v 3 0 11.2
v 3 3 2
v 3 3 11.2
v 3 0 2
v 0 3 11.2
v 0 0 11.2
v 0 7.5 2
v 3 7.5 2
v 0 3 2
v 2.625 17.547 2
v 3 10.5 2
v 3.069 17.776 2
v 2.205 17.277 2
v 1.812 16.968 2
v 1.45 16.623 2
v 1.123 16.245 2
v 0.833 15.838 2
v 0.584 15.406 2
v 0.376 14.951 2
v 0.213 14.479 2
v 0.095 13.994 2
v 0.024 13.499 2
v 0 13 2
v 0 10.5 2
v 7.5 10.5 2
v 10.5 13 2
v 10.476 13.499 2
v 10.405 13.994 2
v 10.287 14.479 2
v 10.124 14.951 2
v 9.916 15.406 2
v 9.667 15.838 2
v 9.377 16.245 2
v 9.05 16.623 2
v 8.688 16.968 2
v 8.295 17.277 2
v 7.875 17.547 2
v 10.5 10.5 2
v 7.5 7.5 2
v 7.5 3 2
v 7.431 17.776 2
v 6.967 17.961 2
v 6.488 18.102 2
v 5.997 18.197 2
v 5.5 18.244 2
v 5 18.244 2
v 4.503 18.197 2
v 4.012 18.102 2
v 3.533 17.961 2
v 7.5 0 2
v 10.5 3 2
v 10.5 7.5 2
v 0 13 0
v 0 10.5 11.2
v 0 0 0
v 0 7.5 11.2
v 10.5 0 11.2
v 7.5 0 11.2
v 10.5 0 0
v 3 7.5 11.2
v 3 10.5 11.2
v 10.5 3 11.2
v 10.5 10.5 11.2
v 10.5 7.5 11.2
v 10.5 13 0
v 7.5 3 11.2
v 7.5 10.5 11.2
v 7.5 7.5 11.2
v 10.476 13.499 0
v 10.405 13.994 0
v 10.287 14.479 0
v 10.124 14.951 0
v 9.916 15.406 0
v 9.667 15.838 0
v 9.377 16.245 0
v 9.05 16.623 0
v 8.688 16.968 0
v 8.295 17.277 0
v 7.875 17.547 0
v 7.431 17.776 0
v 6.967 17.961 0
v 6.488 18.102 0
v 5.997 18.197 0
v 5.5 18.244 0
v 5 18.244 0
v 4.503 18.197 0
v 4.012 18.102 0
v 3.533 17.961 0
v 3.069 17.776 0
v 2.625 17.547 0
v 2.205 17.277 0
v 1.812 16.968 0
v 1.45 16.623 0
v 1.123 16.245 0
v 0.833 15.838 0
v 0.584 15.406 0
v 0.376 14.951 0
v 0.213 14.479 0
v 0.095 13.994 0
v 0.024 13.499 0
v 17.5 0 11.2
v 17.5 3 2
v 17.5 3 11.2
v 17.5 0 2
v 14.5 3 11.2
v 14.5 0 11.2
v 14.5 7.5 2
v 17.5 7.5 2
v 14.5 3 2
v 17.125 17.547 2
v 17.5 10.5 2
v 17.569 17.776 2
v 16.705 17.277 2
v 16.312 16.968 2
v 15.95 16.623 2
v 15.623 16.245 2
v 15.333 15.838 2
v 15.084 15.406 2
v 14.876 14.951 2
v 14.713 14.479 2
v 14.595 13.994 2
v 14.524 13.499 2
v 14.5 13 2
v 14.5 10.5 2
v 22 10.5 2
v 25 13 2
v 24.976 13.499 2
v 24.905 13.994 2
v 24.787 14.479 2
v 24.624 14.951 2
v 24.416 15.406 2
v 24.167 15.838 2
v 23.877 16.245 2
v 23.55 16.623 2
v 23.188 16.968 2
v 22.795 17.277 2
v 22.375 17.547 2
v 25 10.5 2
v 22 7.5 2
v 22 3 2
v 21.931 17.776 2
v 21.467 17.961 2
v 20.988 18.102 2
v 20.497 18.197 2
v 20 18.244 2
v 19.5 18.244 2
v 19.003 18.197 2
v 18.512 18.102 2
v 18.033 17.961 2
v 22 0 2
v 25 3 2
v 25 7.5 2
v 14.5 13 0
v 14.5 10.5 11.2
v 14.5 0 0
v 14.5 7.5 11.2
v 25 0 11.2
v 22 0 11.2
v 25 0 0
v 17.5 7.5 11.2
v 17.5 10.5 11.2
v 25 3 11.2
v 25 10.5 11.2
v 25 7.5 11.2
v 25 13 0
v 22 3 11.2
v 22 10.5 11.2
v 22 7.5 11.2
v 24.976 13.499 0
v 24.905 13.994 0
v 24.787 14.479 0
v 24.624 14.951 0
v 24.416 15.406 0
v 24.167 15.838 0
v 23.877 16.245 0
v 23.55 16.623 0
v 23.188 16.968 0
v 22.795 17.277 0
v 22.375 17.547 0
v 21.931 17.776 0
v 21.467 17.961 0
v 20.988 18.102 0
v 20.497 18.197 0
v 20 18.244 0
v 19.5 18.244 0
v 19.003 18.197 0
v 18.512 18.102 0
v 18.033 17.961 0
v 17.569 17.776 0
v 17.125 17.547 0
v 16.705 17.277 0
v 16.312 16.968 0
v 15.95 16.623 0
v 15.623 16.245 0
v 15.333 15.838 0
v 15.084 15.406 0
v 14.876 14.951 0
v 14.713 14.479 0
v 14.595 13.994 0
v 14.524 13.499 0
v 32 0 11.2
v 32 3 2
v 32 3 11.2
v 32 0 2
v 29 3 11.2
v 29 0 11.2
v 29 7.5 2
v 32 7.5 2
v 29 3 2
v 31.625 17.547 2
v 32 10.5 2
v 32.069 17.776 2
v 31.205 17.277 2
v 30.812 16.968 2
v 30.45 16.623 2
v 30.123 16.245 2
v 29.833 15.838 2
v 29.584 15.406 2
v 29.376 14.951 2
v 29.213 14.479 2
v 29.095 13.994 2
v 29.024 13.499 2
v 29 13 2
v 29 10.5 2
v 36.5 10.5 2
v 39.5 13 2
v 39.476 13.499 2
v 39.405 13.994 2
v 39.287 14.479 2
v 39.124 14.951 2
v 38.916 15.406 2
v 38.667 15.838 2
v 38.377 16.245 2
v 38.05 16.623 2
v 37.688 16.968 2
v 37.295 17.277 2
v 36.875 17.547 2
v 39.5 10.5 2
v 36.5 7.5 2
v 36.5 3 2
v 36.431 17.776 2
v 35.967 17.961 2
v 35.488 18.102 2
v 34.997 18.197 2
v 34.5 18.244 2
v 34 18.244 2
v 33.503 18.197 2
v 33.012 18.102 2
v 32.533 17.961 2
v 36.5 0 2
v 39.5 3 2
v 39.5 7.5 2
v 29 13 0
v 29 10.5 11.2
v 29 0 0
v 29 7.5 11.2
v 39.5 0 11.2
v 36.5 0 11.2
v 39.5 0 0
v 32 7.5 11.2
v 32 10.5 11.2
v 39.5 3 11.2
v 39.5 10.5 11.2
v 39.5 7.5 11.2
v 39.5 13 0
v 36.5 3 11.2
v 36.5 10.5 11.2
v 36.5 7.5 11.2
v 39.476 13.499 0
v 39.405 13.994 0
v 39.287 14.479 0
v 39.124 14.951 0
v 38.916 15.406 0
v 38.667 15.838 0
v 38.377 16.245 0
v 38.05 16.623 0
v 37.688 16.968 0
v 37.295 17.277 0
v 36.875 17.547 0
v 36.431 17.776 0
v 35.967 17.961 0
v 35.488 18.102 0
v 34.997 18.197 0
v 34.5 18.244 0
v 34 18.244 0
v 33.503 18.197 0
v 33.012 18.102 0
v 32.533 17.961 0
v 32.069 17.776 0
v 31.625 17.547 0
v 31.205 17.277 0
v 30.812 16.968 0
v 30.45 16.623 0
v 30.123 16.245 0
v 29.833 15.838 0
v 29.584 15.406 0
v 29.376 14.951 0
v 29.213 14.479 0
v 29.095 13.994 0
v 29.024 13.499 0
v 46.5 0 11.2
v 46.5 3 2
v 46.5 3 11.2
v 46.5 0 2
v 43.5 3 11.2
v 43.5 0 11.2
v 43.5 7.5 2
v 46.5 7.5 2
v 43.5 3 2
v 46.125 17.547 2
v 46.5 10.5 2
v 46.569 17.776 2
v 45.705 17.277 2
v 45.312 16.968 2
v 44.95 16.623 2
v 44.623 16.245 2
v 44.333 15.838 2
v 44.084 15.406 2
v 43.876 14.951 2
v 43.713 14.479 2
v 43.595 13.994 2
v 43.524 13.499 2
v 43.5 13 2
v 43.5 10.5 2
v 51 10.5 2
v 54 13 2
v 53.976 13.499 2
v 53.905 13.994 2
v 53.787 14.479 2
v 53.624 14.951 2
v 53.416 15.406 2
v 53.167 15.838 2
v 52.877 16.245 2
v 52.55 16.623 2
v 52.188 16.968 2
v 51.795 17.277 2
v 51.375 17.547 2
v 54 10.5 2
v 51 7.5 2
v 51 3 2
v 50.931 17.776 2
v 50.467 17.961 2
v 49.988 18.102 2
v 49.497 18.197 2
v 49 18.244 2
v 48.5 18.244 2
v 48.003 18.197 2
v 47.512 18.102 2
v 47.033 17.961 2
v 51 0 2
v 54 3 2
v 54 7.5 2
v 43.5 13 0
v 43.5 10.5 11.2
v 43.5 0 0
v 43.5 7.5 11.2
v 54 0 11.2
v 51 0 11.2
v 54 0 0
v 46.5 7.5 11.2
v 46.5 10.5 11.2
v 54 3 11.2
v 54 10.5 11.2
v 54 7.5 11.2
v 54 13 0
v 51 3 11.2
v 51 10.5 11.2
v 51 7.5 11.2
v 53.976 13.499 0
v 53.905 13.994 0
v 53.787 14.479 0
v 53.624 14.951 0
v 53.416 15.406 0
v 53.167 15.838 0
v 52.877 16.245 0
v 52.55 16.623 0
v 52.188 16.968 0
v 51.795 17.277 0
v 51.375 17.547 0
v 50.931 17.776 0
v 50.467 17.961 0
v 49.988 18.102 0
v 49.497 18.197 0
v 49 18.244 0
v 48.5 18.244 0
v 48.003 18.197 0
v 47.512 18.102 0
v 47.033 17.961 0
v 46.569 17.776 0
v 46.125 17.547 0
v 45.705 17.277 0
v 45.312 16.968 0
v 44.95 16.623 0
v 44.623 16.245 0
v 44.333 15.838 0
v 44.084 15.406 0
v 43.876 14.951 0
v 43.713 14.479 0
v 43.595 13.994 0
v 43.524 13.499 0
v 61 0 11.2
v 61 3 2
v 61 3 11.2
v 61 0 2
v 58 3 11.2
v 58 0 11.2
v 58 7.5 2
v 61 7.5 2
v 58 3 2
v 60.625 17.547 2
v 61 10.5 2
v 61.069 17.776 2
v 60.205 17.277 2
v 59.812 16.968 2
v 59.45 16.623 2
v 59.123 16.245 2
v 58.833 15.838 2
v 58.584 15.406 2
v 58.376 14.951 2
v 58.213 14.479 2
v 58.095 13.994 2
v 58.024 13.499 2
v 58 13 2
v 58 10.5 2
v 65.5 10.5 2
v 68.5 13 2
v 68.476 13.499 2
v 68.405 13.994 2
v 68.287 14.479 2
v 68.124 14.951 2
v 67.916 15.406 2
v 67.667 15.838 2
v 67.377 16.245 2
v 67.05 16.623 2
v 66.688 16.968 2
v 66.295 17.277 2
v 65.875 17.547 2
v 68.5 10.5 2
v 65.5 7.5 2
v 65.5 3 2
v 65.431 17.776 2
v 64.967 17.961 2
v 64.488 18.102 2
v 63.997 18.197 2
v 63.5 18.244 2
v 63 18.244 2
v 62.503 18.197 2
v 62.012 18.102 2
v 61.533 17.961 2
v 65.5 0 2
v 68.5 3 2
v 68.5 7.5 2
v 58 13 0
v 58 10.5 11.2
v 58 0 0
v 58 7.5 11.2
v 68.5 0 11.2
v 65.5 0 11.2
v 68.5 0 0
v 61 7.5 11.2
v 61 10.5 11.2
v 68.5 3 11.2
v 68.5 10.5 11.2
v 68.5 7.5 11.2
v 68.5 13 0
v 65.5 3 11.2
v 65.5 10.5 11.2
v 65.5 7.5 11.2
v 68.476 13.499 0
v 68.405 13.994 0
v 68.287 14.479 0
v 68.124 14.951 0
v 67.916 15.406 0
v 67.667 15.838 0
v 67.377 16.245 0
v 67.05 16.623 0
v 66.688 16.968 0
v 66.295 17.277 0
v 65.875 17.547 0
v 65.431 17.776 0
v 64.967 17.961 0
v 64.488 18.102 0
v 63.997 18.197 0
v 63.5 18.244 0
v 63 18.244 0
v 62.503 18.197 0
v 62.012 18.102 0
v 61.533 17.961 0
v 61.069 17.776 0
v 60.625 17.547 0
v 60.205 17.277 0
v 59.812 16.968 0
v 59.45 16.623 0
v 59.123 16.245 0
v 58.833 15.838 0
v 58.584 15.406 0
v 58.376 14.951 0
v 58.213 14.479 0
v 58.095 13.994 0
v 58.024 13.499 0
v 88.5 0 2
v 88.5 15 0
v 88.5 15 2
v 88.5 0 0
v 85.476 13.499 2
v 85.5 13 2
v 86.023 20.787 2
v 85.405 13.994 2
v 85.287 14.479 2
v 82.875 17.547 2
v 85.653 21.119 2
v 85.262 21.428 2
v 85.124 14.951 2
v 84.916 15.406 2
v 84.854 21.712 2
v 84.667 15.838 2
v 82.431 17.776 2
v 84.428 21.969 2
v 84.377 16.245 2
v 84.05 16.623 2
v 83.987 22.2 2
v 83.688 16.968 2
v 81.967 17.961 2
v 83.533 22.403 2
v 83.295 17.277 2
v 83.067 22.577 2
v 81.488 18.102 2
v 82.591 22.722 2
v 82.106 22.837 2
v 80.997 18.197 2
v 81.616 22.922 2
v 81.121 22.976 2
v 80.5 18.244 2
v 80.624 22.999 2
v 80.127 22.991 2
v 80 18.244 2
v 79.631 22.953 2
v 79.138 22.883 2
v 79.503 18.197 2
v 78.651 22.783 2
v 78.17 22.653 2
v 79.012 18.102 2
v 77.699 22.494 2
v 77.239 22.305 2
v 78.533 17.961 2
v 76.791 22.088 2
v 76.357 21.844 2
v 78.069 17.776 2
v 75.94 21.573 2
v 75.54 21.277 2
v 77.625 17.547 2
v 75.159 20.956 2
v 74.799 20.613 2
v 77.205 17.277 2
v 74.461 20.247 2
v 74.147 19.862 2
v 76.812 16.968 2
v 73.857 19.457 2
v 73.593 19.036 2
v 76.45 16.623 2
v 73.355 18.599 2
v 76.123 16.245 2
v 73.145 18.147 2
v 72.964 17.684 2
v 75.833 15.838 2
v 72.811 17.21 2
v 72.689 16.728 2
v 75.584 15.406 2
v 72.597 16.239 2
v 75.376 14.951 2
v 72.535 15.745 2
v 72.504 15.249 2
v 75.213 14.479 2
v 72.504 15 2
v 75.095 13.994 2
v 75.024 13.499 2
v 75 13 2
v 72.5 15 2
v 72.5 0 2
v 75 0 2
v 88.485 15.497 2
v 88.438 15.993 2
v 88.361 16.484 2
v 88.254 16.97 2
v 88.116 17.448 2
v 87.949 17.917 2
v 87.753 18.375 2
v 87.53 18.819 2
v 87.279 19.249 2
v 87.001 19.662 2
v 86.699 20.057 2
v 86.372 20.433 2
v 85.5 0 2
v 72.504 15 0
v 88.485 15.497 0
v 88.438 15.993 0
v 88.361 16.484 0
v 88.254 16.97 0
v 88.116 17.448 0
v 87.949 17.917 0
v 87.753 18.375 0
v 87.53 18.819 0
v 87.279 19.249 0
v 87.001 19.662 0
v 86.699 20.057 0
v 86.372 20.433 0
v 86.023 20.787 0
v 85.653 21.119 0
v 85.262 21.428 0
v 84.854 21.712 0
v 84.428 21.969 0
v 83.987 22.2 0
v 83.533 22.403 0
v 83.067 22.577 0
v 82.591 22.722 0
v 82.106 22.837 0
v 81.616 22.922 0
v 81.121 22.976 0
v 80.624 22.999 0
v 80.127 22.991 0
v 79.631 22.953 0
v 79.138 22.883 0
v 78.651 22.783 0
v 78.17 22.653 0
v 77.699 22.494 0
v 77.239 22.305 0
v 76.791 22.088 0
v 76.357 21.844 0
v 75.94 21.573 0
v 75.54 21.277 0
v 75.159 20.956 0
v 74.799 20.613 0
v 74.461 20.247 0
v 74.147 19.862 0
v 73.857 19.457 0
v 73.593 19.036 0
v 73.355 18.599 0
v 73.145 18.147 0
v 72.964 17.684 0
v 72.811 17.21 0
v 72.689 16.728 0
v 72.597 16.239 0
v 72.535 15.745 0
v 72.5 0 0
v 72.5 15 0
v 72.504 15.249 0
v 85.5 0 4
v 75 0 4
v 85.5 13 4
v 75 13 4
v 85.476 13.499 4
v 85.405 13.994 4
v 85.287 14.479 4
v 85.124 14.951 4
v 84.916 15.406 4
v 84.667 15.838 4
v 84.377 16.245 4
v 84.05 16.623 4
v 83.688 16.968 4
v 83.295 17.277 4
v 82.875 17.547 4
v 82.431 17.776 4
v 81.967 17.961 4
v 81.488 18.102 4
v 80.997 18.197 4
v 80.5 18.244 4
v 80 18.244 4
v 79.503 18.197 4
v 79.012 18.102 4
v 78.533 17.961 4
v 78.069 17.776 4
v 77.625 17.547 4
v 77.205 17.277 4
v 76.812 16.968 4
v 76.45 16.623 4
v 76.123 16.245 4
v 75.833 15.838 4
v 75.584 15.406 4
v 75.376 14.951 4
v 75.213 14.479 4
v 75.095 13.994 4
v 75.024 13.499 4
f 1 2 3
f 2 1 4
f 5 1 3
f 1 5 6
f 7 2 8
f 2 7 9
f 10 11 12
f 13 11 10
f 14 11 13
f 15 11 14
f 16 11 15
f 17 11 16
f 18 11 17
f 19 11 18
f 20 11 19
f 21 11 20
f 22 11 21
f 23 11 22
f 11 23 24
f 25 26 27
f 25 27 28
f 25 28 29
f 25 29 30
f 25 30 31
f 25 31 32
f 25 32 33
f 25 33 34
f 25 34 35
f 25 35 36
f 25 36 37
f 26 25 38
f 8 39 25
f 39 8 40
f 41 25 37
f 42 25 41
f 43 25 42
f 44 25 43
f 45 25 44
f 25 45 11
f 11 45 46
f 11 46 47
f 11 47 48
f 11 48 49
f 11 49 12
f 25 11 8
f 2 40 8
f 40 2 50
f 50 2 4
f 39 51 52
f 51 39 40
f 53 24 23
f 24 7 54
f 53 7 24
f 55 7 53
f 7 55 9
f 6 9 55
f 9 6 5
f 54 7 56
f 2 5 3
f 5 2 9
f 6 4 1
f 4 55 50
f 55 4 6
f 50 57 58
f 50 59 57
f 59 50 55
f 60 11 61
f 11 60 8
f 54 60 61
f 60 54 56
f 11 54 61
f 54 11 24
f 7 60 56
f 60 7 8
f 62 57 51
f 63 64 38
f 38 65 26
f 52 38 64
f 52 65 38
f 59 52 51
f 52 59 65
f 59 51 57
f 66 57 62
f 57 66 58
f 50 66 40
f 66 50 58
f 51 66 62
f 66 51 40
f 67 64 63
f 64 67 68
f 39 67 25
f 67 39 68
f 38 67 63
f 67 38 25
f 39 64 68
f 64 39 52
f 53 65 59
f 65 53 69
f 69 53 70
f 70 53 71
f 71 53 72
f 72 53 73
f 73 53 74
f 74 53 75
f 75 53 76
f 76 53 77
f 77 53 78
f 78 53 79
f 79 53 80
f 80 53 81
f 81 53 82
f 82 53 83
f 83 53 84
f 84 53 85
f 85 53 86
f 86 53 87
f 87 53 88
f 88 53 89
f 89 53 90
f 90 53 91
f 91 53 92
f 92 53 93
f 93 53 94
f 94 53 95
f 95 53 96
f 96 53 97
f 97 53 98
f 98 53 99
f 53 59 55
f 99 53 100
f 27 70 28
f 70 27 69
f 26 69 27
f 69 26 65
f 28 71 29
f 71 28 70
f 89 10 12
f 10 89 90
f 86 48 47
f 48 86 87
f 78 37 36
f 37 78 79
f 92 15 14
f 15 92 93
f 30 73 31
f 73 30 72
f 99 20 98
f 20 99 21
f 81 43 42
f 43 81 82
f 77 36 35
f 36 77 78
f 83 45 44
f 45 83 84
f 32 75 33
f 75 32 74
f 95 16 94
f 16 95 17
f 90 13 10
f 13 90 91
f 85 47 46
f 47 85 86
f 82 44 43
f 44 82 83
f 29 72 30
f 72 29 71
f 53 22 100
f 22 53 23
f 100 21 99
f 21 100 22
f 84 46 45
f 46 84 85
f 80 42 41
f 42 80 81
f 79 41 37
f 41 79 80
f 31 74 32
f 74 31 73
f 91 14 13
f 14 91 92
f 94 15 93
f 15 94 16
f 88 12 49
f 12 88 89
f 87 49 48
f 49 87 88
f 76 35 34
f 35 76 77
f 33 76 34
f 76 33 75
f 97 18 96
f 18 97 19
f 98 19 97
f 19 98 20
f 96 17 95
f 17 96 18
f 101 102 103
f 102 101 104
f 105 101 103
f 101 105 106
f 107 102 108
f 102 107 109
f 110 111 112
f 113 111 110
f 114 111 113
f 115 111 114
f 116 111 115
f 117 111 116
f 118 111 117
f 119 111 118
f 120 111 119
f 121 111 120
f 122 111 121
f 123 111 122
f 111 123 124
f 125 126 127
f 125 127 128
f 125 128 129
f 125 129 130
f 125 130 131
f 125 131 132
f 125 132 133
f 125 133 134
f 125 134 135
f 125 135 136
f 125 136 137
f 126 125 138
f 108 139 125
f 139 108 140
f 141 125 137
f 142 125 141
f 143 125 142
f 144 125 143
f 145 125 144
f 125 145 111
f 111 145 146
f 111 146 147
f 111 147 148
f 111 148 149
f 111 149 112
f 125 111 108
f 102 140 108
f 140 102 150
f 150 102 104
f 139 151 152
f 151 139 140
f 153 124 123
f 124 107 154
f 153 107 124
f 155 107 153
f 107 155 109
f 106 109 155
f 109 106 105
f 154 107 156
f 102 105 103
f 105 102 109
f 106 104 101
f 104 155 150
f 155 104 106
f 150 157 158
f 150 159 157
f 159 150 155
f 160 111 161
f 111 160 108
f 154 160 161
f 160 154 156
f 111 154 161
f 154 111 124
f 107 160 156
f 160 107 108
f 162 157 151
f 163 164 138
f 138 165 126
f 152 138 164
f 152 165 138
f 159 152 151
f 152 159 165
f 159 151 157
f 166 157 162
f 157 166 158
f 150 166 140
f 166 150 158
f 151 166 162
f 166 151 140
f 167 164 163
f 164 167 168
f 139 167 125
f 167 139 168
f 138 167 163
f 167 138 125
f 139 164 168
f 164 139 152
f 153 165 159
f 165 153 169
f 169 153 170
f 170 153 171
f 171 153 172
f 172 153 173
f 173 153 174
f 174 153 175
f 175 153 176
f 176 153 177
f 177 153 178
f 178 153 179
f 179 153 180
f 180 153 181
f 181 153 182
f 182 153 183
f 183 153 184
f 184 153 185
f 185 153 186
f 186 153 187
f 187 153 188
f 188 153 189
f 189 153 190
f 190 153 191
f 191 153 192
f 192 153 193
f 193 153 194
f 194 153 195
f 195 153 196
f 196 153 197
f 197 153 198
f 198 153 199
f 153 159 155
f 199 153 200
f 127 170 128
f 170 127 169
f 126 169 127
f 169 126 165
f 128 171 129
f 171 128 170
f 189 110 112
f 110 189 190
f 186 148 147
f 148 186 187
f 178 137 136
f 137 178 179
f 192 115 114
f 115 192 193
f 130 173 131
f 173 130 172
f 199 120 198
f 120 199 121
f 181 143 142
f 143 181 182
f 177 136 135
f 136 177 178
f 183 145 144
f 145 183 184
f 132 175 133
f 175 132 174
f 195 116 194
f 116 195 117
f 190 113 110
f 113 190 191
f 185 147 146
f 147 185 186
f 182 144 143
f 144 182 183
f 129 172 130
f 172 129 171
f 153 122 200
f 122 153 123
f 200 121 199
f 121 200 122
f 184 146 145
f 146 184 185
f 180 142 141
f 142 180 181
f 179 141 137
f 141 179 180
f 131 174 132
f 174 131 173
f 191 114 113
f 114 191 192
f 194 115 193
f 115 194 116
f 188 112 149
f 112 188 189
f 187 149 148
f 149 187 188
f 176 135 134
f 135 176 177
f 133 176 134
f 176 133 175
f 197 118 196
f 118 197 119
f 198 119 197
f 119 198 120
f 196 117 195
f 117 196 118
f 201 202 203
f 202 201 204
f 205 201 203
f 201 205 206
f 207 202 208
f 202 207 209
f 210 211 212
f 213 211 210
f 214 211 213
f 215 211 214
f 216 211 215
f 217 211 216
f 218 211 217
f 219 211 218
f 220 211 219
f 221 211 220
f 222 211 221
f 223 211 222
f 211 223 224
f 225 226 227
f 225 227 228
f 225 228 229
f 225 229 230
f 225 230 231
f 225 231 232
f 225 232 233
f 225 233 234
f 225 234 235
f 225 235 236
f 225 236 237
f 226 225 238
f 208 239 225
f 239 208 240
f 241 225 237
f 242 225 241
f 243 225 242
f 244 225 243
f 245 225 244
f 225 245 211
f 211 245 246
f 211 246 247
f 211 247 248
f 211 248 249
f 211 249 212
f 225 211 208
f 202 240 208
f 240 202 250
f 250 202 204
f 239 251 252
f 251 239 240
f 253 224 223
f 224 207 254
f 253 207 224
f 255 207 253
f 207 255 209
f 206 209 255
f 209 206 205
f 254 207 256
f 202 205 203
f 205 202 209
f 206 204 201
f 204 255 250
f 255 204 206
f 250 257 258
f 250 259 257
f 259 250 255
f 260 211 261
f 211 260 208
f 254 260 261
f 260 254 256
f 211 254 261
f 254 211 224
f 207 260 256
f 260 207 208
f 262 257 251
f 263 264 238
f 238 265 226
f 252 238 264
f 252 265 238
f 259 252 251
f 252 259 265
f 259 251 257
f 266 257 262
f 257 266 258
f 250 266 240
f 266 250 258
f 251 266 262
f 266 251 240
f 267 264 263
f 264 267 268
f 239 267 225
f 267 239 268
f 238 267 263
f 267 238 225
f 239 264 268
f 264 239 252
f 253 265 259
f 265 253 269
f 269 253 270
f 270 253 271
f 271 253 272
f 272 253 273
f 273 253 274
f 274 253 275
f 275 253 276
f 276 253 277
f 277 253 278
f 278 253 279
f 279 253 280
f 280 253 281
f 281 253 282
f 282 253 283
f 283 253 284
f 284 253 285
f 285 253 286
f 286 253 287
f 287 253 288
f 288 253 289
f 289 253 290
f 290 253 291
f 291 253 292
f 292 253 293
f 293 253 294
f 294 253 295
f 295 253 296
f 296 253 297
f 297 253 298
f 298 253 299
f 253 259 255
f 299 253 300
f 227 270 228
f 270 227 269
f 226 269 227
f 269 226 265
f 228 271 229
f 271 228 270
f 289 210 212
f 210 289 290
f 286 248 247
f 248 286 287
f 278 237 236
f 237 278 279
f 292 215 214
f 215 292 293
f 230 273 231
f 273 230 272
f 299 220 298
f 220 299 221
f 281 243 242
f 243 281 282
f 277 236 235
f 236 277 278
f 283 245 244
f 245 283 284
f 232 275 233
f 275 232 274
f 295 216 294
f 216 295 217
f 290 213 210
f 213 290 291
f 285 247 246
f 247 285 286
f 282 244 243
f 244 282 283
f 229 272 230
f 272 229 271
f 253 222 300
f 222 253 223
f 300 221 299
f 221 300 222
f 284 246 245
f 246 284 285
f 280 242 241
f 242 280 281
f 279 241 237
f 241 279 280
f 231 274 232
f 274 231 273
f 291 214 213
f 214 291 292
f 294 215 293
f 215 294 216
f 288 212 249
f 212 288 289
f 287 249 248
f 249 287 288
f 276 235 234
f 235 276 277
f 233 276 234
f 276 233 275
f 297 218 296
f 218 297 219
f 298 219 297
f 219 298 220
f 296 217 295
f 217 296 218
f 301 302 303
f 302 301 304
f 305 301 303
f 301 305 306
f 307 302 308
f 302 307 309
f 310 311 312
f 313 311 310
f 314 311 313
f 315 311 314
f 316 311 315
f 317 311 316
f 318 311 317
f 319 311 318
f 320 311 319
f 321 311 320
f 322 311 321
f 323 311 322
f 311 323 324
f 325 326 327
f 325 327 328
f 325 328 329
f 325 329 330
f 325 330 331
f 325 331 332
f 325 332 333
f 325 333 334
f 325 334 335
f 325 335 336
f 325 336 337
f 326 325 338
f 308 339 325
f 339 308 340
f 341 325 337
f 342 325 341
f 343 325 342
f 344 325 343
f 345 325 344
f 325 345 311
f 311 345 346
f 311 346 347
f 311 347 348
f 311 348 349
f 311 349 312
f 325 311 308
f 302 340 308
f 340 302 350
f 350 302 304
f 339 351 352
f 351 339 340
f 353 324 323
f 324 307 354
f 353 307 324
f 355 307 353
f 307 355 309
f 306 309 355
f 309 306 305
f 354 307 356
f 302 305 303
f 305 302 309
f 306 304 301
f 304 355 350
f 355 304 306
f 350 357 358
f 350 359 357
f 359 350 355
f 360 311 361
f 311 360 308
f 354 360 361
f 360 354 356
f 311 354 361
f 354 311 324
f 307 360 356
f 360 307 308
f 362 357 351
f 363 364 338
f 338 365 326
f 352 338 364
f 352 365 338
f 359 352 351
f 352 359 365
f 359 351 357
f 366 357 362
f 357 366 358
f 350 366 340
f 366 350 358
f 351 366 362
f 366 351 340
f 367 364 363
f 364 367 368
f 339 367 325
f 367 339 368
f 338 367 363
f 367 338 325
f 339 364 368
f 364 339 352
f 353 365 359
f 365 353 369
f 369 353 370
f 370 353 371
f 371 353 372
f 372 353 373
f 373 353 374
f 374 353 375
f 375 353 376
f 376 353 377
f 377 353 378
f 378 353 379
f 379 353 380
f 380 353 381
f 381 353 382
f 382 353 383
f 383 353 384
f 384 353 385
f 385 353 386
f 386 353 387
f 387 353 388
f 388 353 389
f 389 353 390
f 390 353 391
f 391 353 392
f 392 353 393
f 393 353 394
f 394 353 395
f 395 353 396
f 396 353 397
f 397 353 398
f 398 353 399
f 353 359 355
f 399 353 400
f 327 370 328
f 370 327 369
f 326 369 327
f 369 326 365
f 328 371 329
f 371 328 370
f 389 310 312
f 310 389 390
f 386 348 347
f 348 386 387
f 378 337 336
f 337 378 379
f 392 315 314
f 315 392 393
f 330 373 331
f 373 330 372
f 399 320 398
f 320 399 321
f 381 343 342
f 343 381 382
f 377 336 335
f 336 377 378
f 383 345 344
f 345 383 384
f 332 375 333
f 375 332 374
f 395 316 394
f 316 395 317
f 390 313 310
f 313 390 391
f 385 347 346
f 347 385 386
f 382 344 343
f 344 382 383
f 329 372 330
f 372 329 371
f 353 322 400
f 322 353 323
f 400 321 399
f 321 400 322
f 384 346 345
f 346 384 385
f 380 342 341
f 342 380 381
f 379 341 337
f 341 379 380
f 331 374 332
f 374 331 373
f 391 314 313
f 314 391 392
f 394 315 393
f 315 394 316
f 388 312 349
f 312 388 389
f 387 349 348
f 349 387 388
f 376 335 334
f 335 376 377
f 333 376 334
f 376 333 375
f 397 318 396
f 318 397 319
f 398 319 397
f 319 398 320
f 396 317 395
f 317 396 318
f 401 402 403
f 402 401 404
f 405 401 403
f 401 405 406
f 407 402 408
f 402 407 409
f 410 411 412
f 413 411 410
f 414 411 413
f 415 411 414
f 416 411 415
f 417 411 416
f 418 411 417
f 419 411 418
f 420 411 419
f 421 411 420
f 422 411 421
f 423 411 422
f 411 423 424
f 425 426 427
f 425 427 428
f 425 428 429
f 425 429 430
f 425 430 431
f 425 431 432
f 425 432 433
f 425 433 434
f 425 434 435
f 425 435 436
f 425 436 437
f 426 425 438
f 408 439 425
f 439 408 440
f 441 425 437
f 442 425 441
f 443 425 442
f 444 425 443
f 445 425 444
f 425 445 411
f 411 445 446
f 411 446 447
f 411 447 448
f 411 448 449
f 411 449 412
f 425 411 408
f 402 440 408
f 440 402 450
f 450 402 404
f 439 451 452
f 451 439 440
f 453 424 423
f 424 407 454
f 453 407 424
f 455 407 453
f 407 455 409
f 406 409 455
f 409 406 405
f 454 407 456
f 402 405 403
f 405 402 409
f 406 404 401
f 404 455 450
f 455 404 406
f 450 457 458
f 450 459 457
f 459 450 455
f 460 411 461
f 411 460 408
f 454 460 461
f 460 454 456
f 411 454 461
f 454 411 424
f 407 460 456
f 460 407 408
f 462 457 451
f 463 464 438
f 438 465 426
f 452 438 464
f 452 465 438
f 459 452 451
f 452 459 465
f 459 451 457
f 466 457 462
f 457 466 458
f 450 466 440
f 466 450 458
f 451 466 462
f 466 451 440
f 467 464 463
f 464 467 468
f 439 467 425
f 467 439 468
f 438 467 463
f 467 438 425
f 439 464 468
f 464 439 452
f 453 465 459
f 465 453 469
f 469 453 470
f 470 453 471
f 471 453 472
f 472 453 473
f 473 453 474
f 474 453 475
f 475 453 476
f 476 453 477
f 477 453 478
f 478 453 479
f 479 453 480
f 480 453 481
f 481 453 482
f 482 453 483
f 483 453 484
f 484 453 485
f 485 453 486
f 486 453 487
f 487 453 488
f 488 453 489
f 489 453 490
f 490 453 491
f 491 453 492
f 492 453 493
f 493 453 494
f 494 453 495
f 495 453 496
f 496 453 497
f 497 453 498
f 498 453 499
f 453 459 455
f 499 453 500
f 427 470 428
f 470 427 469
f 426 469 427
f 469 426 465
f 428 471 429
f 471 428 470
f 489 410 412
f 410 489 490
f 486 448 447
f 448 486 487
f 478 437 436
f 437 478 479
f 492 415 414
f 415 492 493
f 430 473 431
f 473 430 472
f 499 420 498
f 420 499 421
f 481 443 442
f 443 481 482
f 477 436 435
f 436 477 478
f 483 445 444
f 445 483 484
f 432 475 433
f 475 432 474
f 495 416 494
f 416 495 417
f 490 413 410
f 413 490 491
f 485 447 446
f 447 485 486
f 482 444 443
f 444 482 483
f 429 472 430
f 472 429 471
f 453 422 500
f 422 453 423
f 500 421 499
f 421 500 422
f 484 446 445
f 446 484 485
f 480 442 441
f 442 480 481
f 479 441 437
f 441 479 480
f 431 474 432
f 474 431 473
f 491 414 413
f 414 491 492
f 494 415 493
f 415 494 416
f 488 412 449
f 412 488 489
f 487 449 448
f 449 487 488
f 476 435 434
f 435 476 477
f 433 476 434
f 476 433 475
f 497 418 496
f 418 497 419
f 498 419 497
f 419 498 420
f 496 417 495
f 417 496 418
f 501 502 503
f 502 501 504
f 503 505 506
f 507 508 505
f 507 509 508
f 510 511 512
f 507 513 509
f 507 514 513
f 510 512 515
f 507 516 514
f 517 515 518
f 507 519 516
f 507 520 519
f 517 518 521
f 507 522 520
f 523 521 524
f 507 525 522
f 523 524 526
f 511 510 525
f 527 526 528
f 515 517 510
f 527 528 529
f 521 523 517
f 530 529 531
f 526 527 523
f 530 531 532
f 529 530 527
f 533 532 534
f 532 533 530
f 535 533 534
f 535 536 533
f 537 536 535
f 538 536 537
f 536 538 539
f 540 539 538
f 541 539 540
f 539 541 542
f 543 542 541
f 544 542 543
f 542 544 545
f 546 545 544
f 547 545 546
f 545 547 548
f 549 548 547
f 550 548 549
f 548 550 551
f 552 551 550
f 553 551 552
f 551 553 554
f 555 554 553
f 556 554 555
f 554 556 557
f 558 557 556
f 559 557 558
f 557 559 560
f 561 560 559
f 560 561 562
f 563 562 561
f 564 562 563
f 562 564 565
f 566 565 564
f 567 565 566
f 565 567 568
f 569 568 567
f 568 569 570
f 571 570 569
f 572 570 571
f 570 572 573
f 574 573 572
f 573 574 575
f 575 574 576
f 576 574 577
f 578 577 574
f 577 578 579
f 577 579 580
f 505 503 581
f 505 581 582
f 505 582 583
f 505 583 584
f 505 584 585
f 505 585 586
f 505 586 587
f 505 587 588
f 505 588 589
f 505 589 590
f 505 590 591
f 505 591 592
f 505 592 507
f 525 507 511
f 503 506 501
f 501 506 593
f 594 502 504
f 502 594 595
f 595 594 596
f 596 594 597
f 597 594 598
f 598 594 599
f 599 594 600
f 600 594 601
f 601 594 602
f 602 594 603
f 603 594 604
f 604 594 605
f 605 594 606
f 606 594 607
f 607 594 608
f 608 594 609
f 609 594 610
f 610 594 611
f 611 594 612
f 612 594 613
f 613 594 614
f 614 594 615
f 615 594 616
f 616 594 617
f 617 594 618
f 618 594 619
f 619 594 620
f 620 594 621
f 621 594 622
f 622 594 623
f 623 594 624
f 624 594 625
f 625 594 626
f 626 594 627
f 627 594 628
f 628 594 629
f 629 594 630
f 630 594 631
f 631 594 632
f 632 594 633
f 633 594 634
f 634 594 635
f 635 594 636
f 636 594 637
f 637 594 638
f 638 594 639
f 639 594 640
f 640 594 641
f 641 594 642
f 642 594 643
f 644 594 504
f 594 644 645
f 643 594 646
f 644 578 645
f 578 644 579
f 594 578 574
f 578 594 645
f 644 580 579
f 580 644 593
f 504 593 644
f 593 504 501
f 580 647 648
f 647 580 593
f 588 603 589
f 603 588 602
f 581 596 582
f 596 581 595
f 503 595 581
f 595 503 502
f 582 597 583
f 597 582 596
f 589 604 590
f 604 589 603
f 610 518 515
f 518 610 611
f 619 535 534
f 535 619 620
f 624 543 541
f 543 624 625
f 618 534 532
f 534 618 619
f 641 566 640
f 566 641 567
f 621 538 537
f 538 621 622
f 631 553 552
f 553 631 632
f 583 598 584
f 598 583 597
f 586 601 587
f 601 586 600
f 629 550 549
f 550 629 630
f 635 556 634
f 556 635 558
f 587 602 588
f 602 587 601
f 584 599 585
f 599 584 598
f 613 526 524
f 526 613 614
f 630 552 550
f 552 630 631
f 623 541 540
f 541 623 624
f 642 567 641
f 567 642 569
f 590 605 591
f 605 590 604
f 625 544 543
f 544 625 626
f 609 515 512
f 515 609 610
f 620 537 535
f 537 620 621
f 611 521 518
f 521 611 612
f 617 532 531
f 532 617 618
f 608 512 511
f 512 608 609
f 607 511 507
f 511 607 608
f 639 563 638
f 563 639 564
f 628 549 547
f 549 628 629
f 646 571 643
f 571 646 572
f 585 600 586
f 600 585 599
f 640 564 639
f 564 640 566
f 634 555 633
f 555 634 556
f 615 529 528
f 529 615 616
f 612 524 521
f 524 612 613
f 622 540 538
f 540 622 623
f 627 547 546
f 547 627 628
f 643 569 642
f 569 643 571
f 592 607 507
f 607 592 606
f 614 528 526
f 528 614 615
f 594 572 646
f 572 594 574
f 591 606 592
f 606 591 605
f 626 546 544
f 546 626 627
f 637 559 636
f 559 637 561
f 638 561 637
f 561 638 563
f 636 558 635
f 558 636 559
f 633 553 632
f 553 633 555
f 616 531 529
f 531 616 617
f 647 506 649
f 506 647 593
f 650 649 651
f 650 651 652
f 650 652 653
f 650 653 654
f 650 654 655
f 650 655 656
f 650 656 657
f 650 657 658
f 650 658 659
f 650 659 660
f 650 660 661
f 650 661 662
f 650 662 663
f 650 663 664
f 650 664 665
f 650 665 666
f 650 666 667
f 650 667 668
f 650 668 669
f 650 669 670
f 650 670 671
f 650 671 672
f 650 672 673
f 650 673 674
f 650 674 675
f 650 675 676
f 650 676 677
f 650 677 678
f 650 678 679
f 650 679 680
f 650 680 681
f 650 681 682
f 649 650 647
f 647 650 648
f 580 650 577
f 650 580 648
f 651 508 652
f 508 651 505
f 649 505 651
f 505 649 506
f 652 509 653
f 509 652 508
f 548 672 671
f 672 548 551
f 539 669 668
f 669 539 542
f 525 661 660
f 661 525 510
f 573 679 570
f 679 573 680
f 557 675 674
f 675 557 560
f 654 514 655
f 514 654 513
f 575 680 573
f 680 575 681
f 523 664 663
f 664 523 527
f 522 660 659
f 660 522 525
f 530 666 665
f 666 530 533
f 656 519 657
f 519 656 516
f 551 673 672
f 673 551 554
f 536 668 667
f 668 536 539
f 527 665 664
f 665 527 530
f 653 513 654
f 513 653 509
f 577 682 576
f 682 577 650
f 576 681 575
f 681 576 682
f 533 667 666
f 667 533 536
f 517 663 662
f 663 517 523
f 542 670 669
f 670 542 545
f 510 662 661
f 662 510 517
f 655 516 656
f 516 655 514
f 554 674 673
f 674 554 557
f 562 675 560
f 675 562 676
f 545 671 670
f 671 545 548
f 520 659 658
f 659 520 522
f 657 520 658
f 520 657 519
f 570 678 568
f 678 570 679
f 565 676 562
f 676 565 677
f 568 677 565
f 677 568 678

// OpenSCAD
//CONFIG
fret_clearance_depth = 2; //Clearance required at the back of the fret. Use GHFretClearanceTestingToolGenerator.scad to determine this. Unit = (mm).

generate_setting_tool = true; // Enable the generation of the setting tool. The setting tool is used to ensure you have removed enough material from the fret and the insert is seated to your specified "fret_clearance_depth". If the setting tool does not bottom out on the back of the fret, more material needs to be removed. . Unit = (true/false).

fret_depth = 13.2; //Internal depth  of the fret. The x and y dimensions of standard GH frets differs slightly between models however z appears to consistent. Measure the internal depth of your frets for accuracy. Unit = (mm).

;

//WHERE THE MAGIC HAPPENS

$fa = 0.5;
$fs = 0.5;
insert_w = 10.5;
insert_l = 13;
leg_w = 3;
leg_l = 3;
part_clearance = 4;
platform_thickness = 2;

for (dx=[0:insert_w+part_clearance:(insert_w+part_clearance)*4]) { //PLATE BUILDER
    translate([dx,0,0]) fret_insert();
        if (dx == (insert_w+part_clearance)*4 && generate_setting_tool){
            translate([dx + (insert_w + part_clearance) ,0,0])setting_tool();
        }
}
module fret_insert() { //insert GENERATOR
    for (xcor=[0:insert_w-leg_w:2*(insert_w-leg_w)-1])
        {
            for (ycor=[0:insert_w-leg_l:(insert_l-leg_l)-1])
                {
                    translate([xcor,ycor,platform_thickness])
                    leg();
        }
    }
        cube([insert_w, insert_l, platform_thickness]);
    translate([insert_w/2,insert_l,0]) cylinder(platform_thickness, insert_w/2, insert_w/2);
}

module leg(){
    leg_height = fret_depth -(fret_clearance_depth + platform_thickness);
    cube([leg_w, leg_l, leg_height]);
}

module setting_tool() { //SETTING TOOL GENERATOR
    cube([16, 15, 2]);
    translate([8,15]) cylinder(2, 8, 8);
    translate([2.5,0,2]) cube([insert_w, insert_l, fret_clearance_depth]);
    translate([(insert_w*0.5)+2.5,insert_l,2]) cylinder(fret_clearance_depth, insert_w*0.5, insert_w*0.5);
}
